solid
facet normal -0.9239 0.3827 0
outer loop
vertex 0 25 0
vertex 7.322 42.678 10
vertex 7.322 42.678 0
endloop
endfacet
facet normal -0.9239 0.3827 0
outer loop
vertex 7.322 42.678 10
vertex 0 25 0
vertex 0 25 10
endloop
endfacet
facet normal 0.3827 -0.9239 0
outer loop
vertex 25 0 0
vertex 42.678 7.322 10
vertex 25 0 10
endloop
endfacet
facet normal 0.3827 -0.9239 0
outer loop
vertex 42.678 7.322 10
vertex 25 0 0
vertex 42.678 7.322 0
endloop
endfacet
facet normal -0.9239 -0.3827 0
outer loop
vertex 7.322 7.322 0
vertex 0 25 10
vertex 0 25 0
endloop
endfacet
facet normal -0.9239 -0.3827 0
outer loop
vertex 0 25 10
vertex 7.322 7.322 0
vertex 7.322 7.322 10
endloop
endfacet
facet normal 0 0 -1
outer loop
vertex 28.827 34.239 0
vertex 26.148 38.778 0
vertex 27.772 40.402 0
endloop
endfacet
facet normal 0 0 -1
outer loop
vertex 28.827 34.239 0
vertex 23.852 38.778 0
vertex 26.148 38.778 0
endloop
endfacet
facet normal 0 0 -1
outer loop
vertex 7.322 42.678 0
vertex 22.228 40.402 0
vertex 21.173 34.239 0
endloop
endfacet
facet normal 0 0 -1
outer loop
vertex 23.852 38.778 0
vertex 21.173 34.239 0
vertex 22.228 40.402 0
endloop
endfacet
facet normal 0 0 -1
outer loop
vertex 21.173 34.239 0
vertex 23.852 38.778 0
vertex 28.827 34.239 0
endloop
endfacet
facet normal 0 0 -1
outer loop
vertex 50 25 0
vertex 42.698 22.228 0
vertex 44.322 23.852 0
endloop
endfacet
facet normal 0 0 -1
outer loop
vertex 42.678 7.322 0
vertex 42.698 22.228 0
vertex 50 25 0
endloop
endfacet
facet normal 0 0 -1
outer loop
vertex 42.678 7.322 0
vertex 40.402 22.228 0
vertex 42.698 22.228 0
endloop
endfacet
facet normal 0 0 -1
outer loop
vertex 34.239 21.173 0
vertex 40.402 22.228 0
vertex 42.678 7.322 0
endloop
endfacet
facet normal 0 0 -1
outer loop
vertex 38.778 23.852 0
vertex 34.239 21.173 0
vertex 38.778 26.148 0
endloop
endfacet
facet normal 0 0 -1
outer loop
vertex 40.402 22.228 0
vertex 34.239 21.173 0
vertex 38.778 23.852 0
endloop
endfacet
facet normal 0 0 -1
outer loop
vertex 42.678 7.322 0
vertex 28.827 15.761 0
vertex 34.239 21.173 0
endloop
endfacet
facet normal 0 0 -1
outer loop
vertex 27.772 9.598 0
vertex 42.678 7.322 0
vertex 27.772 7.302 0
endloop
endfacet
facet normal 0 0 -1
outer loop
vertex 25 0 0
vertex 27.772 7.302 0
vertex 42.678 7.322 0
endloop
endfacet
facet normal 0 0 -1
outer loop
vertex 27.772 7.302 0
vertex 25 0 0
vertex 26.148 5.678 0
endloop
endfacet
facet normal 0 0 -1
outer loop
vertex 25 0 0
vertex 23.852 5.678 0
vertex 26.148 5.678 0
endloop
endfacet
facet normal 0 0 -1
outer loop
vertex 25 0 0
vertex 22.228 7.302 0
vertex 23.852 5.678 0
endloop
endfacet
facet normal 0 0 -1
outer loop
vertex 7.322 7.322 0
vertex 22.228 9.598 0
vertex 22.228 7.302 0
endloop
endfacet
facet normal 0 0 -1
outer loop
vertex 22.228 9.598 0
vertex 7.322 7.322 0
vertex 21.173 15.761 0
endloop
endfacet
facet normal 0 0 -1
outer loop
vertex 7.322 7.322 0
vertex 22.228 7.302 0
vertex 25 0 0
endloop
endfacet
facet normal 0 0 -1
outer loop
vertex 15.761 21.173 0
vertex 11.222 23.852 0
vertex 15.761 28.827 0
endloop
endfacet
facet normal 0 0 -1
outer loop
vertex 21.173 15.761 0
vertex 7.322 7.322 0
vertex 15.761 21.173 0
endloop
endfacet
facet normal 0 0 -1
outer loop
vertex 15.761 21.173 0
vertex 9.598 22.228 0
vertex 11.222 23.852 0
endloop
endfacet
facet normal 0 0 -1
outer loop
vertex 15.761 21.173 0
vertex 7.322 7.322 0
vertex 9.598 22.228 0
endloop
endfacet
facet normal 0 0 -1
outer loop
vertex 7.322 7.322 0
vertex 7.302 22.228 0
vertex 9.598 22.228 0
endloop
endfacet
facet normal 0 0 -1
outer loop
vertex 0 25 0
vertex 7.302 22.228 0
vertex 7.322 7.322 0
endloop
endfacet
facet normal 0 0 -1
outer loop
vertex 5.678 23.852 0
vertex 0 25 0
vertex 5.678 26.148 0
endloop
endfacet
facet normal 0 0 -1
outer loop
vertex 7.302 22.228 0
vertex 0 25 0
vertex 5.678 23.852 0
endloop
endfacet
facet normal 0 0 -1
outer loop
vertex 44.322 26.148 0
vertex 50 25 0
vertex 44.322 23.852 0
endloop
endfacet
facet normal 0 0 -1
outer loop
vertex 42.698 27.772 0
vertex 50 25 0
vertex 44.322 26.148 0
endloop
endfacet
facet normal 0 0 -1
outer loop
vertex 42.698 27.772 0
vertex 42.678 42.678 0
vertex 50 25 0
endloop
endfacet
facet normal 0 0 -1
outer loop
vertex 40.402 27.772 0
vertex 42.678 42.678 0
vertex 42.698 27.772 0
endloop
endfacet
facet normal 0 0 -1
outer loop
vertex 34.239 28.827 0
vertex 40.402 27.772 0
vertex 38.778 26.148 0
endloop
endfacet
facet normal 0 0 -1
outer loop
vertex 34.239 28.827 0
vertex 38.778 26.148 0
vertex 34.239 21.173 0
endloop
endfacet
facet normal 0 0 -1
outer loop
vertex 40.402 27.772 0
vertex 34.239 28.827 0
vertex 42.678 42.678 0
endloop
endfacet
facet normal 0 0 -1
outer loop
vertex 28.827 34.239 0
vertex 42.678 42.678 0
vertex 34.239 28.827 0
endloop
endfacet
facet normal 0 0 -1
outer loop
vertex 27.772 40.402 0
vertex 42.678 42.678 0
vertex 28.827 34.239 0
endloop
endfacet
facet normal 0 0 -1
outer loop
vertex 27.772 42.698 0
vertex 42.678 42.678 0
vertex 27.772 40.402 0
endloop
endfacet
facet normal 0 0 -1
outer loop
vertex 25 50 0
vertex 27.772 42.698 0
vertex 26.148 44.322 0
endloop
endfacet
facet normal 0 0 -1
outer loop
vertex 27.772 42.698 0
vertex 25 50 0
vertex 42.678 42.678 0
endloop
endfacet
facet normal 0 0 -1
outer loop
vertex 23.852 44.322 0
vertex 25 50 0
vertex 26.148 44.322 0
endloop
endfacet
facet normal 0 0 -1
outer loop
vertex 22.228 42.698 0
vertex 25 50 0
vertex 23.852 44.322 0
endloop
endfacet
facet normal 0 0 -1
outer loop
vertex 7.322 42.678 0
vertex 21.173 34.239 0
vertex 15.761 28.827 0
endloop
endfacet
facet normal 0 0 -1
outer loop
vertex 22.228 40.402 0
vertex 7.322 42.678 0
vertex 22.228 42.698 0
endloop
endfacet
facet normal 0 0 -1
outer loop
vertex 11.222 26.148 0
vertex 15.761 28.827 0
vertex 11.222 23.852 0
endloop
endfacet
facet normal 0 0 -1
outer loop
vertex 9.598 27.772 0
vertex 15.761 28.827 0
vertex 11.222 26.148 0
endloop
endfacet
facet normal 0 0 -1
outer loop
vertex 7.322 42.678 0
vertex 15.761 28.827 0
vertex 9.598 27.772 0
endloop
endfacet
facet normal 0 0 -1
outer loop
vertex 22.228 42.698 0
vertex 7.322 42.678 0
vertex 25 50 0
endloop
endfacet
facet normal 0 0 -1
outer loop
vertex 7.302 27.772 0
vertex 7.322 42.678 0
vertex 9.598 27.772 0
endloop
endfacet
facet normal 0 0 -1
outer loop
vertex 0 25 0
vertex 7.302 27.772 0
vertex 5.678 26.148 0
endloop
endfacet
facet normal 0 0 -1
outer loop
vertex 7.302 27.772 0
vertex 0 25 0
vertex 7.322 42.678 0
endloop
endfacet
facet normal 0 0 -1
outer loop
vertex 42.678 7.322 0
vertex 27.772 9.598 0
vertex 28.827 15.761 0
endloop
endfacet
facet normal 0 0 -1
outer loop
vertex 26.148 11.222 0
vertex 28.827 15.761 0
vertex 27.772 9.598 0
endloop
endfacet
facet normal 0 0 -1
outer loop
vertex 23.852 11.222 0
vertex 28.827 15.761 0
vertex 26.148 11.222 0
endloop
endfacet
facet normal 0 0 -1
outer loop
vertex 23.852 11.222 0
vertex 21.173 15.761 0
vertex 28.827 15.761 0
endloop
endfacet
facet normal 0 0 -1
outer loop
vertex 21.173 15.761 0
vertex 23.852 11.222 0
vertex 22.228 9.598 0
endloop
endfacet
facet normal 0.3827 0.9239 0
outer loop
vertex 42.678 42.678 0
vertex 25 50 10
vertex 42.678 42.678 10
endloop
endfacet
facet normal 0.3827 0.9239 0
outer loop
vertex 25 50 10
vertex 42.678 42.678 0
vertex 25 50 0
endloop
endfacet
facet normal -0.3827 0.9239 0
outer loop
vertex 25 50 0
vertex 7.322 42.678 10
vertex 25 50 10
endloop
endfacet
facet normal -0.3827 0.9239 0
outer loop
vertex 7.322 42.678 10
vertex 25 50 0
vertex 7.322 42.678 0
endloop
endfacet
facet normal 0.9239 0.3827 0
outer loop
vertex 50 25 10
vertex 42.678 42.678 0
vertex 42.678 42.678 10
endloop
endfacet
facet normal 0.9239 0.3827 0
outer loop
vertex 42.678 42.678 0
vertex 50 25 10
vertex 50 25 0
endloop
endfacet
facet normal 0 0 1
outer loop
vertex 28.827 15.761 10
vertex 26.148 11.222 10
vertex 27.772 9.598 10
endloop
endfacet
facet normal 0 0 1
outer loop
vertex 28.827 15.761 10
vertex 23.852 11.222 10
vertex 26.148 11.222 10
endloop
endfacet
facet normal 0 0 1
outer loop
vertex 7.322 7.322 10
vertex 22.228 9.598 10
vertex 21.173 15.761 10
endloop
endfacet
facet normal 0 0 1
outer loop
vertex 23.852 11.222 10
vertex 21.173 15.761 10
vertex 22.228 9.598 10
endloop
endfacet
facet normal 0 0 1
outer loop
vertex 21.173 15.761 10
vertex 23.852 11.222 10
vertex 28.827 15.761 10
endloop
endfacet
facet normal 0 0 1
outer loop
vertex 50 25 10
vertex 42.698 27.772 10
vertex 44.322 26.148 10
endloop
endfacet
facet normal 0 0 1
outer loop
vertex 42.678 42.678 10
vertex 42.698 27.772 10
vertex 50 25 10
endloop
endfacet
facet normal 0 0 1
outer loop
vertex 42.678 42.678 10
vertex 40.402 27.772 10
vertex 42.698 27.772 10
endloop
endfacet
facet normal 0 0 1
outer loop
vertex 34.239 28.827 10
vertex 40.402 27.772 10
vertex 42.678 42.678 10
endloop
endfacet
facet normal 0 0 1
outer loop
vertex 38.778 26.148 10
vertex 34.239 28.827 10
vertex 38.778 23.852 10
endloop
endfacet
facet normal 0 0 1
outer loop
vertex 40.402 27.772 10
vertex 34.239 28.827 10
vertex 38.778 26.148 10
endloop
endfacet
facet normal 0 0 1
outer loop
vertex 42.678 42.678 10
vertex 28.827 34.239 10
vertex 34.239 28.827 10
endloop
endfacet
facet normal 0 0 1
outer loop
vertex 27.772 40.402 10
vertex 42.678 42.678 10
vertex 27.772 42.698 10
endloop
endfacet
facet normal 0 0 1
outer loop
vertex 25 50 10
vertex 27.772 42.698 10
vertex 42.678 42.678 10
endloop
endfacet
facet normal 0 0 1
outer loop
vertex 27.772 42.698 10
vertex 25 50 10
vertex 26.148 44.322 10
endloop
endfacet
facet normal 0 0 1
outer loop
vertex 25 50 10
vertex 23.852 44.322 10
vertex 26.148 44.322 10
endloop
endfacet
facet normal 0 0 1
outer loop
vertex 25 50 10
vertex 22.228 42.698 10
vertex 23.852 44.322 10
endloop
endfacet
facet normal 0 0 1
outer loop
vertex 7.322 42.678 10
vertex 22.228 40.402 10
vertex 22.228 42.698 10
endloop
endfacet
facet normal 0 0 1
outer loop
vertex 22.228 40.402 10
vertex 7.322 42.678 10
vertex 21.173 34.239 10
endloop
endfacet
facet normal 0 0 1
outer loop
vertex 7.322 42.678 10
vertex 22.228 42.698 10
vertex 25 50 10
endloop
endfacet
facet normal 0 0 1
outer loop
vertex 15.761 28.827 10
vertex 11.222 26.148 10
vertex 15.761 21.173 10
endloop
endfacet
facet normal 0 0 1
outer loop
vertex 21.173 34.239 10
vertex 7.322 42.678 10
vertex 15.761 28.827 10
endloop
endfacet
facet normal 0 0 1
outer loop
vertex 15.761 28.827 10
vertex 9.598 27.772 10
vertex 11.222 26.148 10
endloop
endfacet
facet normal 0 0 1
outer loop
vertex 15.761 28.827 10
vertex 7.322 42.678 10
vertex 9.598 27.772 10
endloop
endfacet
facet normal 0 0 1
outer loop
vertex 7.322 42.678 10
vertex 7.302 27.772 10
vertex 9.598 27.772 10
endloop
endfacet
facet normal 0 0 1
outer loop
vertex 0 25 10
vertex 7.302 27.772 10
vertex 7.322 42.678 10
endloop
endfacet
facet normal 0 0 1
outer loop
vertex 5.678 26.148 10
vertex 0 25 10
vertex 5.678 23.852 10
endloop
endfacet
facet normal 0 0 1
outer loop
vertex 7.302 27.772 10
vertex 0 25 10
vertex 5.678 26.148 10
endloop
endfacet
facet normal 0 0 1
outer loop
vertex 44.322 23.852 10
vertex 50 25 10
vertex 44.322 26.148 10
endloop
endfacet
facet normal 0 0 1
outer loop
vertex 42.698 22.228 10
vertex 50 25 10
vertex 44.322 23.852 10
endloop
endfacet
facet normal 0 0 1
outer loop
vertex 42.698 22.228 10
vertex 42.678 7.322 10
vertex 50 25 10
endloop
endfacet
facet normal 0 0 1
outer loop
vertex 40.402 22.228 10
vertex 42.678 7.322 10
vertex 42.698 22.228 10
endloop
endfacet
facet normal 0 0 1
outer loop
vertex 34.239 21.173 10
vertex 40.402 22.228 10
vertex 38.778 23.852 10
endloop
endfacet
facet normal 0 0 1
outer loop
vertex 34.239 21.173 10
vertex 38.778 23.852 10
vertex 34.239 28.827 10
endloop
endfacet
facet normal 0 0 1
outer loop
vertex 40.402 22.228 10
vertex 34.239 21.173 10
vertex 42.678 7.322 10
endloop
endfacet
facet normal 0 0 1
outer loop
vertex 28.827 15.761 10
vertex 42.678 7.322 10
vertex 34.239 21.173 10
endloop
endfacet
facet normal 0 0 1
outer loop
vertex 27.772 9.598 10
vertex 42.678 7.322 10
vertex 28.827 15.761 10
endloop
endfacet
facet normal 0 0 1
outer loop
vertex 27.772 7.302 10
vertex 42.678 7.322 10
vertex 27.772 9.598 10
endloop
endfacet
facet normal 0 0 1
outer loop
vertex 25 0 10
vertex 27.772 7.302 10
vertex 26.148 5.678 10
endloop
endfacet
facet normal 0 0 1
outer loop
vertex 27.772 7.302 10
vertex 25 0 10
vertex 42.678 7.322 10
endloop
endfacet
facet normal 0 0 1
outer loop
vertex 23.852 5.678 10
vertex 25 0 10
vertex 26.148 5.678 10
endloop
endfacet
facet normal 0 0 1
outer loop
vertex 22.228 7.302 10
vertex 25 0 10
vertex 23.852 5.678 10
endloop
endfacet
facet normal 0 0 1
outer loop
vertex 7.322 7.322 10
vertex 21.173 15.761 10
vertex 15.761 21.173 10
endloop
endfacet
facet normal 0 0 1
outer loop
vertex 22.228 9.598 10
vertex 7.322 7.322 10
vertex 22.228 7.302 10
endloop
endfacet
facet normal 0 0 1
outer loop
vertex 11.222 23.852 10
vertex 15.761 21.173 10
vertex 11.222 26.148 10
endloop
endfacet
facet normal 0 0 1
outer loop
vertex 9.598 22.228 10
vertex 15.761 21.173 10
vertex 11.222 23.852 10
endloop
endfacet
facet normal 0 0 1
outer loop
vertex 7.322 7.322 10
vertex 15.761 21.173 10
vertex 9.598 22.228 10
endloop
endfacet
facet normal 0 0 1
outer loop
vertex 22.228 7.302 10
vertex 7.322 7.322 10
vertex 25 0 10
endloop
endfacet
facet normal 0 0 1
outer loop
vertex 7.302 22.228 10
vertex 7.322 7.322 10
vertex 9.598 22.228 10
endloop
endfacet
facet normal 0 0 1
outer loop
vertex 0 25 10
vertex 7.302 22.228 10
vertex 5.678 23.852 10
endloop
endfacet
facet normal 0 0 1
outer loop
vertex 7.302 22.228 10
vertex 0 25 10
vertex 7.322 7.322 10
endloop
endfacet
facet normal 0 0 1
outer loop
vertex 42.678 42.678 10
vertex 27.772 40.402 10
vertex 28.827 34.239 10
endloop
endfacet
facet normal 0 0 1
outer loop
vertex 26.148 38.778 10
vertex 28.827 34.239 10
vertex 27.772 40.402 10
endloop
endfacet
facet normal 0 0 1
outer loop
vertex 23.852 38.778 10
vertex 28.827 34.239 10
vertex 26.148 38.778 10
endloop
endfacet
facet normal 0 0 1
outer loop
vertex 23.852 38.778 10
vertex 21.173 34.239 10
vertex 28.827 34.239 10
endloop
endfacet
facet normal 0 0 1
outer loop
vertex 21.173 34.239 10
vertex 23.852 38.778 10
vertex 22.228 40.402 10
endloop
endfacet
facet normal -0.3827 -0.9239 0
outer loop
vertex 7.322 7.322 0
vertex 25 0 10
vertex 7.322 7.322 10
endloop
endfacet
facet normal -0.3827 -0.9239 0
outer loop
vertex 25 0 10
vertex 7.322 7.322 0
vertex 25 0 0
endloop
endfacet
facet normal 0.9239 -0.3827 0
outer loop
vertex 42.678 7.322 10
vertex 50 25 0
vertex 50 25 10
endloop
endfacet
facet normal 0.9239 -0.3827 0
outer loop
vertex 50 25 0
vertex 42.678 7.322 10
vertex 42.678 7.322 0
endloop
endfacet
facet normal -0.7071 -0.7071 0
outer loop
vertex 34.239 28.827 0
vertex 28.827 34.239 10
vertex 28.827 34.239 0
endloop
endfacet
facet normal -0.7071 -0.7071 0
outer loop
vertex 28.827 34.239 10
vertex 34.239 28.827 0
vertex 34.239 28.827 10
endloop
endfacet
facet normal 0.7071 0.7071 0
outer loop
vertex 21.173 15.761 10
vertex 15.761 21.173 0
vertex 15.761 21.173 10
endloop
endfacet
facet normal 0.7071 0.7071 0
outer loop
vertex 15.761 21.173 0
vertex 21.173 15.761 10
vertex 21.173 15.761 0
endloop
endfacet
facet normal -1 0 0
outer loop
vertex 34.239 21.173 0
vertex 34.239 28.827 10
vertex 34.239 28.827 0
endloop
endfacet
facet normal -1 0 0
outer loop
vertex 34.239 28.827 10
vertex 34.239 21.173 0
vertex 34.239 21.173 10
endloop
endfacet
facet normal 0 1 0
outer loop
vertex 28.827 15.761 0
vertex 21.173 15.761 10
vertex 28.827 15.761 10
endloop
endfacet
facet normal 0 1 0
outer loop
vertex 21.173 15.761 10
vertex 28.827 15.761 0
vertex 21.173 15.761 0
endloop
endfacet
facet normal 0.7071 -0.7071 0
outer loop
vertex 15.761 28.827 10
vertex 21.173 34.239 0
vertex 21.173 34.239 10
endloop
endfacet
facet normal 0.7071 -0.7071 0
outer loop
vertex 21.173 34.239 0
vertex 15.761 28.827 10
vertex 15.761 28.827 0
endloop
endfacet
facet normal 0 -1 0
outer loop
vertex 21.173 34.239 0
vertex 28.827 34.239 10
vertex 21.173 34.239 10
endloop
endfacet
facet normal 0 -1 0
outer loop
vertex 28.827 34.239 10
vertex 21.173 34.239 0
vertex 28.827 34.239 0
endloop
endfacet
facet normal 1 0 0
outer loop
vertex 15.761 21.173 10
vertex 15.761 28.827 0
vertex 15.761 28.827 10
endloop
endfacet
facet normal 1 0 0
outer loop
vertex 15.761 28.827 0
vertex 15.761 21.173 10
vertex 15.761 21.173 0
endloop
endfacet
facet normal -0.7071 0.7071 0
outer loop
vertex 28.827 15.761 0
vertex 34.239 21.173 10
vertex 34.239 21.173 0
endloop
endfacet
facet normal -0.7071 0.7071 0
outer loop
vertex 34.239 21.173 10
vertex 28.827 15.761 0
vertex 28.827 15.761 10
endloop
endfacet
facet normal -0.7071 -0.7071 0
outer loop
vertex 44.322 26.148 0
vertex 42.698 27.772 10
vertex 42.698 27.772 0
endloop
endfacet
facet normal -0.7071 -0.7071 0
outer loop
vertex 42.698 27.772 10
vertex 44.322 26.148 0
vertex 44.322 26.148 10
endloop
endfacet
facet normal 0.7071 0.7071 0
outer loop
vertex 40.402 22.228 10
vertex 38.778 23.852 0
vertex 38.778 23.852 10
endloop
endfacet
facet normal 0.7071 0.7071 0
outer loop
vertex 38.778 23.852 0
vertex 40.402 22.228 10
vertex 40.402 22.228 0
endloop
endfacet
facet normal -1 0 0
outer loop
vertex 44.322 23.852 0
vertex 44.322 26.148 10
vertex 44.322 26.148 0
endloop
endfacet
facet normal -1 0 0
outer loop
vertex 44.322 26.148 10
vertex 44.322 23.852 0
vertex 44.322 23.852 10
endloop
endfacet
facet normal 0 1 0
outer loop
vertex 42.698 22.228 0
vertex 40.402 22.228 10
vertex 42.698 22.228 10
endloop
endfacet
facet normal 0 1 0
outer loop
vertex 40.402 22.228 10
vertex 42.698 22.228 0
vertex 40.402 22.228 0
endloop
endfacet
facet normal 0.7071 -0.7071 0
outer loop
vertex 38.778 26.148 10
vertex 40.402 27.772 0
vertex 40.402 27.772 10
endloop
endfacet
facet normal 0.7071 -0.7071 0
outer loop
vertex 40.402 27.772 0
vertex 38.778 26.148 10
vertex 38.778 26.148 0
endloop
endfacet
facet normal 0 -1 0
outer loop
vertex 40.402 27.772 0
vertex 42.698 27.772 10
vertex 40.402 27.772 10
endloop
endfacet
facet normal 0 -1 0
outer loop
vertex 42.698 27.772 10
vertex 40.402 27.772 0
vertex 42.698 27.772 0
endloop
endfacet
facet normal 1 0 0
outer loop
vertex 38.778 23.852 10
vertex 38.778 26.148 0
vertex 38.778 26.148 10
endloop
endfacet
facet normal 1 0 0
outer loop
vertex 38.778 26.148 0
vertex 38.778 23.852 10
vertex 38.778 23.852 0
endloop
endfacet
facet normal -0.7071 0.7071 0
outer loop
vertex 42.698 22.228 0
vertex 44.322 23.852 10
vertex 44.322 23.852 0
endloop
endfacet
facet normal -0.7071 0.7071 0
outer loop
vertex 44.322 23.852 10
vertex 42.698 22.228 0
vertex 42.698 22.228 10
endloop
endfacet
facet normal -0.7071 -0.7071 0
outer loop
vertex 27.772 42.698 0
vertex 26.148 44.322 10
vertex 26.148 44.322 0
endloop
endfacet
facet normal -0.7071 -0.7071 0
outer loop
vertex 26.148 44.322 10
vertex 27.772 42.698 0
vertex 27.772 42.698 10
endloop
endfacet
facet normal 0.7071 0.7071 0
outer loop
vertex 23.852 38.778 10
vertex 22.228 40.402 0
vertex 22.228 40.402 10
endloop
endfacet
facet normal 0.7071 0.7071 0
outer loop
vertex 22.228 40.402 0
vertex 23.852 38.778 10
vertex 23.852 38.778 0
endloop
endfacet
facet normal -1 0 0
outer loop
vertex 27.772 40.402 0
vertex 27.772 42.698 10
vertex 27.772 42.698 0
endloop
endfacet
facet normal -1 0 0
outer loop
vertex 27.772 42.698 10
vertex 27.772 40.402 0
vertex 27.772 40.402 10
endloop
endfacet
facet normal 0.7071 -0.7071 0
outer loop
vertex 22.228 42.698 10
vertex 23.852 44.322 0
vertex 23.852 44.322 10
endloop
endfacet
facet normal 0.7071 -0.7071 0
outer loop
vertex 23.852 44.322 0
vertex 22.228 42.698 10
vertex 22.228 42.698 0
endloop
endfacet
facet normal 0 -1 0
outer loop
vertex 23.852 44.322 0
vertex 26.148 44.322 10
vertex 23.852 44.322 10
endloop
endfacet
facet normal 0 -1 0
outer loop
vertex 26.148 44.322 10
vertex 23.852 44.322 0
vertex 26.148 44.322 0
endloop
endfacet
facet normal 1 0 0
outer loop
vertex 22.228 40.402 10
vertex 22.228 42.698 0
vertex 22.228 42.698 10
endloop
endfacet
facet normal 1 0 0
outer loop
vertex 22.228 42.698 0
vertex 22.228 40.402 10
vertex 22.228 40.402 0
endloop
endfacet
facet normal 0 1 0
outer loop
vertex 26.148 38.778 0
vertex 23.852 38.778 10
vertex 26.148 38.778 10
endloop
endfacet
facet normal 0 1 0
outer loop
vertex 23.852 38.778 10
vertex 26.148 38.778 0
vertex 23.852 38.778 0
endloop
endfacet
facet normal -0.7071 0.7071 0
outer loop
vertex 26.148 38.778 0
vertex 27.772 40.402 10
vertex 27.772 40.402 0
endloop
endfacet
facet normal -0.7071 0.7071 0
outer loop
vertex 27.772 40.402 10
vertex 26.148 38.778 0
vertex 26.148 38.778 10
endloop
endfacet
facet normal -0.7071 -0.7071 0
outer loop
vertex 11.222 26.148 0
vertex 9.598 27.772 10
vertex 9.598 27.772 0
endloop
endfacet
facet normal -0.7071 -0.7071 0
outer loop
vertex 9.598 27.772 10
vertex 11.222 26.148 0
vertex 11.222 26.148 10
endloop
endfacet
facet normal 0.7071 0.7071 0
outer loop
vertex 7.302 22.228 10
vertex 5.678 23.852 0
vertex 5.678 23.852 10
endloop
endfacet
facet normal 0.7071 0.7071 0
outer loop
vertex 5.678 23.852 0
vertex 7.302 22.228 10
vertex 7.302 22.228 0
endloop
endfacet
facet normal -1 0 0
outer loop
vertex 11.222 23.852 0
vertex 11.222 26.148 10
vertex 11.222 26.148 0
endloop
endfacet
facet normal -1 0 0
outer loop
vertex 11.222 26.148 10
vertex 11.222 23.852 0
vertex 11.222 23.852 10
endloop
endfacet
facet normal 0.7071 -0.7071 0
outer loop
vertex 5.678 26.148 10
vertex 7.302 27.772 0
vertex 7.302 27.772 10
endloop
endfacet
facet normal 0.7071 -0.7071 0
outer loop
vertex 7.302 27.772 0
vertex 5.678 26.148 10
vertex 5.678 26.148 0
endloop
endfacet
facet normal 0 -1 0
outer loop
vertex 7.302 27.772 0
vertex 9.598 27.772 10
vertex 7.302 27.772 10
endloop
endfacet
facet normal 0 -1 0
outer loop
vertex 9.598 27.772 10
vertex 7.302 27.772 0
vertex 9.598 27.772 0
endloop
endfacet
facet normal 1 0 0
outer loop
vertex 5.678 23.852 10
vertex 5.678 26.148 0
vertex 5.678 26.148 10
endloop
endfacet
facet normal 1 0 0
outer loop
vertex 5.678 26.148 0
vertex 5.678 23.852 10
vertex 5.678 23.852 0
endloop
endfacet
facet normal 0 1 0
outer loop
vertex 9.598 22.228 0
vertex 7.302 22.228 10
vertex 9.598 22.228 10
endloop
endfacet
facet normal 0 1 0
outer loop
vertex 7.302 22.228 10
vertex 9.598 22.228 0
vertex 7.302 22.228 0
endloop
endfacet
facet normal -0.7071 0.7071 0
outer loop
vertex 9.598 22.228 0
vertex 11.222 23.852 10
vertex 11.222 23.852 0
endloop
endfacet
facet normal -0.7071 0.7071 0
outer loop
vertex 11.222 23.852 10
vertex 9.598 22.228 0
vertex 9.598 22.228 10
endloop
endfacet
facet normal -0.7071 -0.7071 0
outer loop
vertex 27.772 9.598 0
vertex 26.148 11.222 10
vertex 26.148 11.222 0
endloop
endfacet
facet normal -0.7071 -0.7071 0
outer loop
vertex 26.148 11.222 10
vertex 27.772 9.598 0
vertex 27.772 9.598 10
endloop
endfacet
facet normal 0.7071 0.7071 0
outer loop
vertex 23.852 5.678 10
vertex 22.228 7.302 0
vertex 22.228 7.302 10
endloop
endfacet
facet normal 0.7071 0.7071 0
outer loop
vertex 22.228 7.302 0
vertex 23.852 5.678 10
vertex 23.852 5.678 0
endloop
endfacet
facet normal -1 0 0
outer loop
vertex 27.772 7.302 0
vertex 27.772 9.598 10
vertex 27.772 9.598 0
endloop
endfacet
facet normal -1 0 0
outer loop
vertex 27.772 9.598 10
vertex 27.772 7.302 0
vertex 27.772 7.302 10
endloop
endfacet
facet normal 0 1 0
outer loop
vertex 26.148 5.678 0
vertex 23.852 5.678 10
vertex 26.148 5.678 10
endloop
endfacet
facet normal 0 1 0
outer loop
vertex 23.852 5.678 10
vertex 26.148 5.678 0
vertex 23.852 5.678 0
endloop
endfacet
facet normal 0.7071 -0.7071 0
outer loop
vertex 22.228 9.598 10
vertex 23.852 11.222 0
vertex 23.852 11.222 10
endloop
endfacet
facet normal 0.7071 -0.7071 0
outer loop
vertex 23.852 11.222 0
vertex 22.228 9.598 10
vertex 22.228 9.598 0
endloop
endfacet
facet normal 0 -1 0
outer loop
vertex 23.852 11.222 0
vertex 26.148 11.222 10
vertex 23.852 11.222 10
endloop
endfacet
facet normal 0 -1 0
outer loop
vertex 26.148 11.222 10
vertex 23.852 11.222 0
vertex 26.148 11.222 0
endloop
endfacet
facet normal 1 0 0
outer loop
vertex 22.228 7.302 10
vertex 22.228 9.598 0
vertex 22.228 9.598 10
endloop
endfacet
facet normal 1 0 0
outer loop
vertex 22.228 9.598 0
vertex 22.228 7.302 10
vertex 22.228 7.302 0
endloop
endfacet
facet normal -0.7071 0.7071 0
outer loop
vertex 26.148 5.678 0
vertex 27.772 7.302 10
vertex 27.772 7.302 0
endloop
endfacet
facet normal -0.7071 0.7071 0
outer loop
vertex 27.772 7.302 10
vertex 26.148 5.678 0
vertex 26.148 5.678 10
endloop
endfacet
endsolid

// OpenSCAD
$fn = 32;

// ----------------------------------------------------------------------
// Polygon plate: 8-gon R25, 4 bolt windows
// ----------------------------------------------------------------------

// --- parameters (mm) ---
sides = 8;                // number of polygon sides
plate_r = 25;             // circumscribed radius of the polygon
bore_r = 10;              // centre bore radius
bolts = 4;                // number of bolt windows
ring_r = 16.55;           // bolt-circle radius
bolt_r = 3;               // bolt window radius
plate_t = 10;             // plate thickness, Z (extrusion height)

plate_d = 2 * plate_r;  // circumscribed diameter
bore_d = 2 * bore_r;  // centre bore diameter
bolt_d = 2 * bolt_r;  // bolt window diameter
ring_d = 2 * ring_r;  // bolt-circle diameter

profile = [[50, 25], [42.678, 42.678], [25, 50], [7.322, 42.678], [0, 25], [7.322, 7.322], [25, 0], [42.678, 7.322]];  // primary outline, 8 points, counter clockwise
void_1 = [[34.239, 28.827], [28.827, 34.239], [21.173, 34.239], [15.761, 28.827], [15.761, 21.173], [21.173, 15.761], [28.827, 15.761], [34.239, 21.173]];  // centre bore, 8 points
void_2 = [[44.322, 26.148], [42.698, 27.772], [40.402, 27.772], [38.778, 26.148], [38.778, 23.852], [40.402, 22.228], [42.698, 22.228], [44.322, 23.852]];  // bolt window 1, 8 points
void_3 = [[27.772, 42.698], [26.148, 44.322], [23.852, 44.322], [22.228, 42.698], [22.228, 40.402], [23.852, 38.778], [26.148, 38.778], [27.772, 40.402]];  // bolt window 2, 8 points
void_4 = [[11.222, 26.148], [9.598, 27.772], [7.302, 27.772], [5.678, 26.148], [5.678, 23.852], [7.302, 22.228], [9.598, 22.228], [11.222, 23.852]];  // bolt window 3, 8 points
void_5 = [[27.772, 9.598], [26.148, 11.222], [23.852, 11.222], [22.228, 9.598], [22.228, 7.302], [23.852, 5.678], [26.148, 5.678], [27.772, 7.302]];  // bolt window 4, 8 points

// --- the one profile operation ---
difference() {
  linear_extrude(height = plate_t) polygon(points = profile);
  translate([0, 0, -1])
    linear_extrude(height = plate_t + 2) polygon(points = void_1);
  translate([0, 0, -1])
    linear_extrude(height = plate_t + 2) polygon(points = void_2);
  translate([0, 0, -1])
    linear_extrude(height = plate_t + 2) polygon(points = void_3);
  translate([0, 0, -1])
    linear_extrude(height = plate_t + 2) polygon(points = void_4);
  translate([0, 0, -1])
    linear_extrude(height = plate_t + 2) polygon(points = void_5);
}
